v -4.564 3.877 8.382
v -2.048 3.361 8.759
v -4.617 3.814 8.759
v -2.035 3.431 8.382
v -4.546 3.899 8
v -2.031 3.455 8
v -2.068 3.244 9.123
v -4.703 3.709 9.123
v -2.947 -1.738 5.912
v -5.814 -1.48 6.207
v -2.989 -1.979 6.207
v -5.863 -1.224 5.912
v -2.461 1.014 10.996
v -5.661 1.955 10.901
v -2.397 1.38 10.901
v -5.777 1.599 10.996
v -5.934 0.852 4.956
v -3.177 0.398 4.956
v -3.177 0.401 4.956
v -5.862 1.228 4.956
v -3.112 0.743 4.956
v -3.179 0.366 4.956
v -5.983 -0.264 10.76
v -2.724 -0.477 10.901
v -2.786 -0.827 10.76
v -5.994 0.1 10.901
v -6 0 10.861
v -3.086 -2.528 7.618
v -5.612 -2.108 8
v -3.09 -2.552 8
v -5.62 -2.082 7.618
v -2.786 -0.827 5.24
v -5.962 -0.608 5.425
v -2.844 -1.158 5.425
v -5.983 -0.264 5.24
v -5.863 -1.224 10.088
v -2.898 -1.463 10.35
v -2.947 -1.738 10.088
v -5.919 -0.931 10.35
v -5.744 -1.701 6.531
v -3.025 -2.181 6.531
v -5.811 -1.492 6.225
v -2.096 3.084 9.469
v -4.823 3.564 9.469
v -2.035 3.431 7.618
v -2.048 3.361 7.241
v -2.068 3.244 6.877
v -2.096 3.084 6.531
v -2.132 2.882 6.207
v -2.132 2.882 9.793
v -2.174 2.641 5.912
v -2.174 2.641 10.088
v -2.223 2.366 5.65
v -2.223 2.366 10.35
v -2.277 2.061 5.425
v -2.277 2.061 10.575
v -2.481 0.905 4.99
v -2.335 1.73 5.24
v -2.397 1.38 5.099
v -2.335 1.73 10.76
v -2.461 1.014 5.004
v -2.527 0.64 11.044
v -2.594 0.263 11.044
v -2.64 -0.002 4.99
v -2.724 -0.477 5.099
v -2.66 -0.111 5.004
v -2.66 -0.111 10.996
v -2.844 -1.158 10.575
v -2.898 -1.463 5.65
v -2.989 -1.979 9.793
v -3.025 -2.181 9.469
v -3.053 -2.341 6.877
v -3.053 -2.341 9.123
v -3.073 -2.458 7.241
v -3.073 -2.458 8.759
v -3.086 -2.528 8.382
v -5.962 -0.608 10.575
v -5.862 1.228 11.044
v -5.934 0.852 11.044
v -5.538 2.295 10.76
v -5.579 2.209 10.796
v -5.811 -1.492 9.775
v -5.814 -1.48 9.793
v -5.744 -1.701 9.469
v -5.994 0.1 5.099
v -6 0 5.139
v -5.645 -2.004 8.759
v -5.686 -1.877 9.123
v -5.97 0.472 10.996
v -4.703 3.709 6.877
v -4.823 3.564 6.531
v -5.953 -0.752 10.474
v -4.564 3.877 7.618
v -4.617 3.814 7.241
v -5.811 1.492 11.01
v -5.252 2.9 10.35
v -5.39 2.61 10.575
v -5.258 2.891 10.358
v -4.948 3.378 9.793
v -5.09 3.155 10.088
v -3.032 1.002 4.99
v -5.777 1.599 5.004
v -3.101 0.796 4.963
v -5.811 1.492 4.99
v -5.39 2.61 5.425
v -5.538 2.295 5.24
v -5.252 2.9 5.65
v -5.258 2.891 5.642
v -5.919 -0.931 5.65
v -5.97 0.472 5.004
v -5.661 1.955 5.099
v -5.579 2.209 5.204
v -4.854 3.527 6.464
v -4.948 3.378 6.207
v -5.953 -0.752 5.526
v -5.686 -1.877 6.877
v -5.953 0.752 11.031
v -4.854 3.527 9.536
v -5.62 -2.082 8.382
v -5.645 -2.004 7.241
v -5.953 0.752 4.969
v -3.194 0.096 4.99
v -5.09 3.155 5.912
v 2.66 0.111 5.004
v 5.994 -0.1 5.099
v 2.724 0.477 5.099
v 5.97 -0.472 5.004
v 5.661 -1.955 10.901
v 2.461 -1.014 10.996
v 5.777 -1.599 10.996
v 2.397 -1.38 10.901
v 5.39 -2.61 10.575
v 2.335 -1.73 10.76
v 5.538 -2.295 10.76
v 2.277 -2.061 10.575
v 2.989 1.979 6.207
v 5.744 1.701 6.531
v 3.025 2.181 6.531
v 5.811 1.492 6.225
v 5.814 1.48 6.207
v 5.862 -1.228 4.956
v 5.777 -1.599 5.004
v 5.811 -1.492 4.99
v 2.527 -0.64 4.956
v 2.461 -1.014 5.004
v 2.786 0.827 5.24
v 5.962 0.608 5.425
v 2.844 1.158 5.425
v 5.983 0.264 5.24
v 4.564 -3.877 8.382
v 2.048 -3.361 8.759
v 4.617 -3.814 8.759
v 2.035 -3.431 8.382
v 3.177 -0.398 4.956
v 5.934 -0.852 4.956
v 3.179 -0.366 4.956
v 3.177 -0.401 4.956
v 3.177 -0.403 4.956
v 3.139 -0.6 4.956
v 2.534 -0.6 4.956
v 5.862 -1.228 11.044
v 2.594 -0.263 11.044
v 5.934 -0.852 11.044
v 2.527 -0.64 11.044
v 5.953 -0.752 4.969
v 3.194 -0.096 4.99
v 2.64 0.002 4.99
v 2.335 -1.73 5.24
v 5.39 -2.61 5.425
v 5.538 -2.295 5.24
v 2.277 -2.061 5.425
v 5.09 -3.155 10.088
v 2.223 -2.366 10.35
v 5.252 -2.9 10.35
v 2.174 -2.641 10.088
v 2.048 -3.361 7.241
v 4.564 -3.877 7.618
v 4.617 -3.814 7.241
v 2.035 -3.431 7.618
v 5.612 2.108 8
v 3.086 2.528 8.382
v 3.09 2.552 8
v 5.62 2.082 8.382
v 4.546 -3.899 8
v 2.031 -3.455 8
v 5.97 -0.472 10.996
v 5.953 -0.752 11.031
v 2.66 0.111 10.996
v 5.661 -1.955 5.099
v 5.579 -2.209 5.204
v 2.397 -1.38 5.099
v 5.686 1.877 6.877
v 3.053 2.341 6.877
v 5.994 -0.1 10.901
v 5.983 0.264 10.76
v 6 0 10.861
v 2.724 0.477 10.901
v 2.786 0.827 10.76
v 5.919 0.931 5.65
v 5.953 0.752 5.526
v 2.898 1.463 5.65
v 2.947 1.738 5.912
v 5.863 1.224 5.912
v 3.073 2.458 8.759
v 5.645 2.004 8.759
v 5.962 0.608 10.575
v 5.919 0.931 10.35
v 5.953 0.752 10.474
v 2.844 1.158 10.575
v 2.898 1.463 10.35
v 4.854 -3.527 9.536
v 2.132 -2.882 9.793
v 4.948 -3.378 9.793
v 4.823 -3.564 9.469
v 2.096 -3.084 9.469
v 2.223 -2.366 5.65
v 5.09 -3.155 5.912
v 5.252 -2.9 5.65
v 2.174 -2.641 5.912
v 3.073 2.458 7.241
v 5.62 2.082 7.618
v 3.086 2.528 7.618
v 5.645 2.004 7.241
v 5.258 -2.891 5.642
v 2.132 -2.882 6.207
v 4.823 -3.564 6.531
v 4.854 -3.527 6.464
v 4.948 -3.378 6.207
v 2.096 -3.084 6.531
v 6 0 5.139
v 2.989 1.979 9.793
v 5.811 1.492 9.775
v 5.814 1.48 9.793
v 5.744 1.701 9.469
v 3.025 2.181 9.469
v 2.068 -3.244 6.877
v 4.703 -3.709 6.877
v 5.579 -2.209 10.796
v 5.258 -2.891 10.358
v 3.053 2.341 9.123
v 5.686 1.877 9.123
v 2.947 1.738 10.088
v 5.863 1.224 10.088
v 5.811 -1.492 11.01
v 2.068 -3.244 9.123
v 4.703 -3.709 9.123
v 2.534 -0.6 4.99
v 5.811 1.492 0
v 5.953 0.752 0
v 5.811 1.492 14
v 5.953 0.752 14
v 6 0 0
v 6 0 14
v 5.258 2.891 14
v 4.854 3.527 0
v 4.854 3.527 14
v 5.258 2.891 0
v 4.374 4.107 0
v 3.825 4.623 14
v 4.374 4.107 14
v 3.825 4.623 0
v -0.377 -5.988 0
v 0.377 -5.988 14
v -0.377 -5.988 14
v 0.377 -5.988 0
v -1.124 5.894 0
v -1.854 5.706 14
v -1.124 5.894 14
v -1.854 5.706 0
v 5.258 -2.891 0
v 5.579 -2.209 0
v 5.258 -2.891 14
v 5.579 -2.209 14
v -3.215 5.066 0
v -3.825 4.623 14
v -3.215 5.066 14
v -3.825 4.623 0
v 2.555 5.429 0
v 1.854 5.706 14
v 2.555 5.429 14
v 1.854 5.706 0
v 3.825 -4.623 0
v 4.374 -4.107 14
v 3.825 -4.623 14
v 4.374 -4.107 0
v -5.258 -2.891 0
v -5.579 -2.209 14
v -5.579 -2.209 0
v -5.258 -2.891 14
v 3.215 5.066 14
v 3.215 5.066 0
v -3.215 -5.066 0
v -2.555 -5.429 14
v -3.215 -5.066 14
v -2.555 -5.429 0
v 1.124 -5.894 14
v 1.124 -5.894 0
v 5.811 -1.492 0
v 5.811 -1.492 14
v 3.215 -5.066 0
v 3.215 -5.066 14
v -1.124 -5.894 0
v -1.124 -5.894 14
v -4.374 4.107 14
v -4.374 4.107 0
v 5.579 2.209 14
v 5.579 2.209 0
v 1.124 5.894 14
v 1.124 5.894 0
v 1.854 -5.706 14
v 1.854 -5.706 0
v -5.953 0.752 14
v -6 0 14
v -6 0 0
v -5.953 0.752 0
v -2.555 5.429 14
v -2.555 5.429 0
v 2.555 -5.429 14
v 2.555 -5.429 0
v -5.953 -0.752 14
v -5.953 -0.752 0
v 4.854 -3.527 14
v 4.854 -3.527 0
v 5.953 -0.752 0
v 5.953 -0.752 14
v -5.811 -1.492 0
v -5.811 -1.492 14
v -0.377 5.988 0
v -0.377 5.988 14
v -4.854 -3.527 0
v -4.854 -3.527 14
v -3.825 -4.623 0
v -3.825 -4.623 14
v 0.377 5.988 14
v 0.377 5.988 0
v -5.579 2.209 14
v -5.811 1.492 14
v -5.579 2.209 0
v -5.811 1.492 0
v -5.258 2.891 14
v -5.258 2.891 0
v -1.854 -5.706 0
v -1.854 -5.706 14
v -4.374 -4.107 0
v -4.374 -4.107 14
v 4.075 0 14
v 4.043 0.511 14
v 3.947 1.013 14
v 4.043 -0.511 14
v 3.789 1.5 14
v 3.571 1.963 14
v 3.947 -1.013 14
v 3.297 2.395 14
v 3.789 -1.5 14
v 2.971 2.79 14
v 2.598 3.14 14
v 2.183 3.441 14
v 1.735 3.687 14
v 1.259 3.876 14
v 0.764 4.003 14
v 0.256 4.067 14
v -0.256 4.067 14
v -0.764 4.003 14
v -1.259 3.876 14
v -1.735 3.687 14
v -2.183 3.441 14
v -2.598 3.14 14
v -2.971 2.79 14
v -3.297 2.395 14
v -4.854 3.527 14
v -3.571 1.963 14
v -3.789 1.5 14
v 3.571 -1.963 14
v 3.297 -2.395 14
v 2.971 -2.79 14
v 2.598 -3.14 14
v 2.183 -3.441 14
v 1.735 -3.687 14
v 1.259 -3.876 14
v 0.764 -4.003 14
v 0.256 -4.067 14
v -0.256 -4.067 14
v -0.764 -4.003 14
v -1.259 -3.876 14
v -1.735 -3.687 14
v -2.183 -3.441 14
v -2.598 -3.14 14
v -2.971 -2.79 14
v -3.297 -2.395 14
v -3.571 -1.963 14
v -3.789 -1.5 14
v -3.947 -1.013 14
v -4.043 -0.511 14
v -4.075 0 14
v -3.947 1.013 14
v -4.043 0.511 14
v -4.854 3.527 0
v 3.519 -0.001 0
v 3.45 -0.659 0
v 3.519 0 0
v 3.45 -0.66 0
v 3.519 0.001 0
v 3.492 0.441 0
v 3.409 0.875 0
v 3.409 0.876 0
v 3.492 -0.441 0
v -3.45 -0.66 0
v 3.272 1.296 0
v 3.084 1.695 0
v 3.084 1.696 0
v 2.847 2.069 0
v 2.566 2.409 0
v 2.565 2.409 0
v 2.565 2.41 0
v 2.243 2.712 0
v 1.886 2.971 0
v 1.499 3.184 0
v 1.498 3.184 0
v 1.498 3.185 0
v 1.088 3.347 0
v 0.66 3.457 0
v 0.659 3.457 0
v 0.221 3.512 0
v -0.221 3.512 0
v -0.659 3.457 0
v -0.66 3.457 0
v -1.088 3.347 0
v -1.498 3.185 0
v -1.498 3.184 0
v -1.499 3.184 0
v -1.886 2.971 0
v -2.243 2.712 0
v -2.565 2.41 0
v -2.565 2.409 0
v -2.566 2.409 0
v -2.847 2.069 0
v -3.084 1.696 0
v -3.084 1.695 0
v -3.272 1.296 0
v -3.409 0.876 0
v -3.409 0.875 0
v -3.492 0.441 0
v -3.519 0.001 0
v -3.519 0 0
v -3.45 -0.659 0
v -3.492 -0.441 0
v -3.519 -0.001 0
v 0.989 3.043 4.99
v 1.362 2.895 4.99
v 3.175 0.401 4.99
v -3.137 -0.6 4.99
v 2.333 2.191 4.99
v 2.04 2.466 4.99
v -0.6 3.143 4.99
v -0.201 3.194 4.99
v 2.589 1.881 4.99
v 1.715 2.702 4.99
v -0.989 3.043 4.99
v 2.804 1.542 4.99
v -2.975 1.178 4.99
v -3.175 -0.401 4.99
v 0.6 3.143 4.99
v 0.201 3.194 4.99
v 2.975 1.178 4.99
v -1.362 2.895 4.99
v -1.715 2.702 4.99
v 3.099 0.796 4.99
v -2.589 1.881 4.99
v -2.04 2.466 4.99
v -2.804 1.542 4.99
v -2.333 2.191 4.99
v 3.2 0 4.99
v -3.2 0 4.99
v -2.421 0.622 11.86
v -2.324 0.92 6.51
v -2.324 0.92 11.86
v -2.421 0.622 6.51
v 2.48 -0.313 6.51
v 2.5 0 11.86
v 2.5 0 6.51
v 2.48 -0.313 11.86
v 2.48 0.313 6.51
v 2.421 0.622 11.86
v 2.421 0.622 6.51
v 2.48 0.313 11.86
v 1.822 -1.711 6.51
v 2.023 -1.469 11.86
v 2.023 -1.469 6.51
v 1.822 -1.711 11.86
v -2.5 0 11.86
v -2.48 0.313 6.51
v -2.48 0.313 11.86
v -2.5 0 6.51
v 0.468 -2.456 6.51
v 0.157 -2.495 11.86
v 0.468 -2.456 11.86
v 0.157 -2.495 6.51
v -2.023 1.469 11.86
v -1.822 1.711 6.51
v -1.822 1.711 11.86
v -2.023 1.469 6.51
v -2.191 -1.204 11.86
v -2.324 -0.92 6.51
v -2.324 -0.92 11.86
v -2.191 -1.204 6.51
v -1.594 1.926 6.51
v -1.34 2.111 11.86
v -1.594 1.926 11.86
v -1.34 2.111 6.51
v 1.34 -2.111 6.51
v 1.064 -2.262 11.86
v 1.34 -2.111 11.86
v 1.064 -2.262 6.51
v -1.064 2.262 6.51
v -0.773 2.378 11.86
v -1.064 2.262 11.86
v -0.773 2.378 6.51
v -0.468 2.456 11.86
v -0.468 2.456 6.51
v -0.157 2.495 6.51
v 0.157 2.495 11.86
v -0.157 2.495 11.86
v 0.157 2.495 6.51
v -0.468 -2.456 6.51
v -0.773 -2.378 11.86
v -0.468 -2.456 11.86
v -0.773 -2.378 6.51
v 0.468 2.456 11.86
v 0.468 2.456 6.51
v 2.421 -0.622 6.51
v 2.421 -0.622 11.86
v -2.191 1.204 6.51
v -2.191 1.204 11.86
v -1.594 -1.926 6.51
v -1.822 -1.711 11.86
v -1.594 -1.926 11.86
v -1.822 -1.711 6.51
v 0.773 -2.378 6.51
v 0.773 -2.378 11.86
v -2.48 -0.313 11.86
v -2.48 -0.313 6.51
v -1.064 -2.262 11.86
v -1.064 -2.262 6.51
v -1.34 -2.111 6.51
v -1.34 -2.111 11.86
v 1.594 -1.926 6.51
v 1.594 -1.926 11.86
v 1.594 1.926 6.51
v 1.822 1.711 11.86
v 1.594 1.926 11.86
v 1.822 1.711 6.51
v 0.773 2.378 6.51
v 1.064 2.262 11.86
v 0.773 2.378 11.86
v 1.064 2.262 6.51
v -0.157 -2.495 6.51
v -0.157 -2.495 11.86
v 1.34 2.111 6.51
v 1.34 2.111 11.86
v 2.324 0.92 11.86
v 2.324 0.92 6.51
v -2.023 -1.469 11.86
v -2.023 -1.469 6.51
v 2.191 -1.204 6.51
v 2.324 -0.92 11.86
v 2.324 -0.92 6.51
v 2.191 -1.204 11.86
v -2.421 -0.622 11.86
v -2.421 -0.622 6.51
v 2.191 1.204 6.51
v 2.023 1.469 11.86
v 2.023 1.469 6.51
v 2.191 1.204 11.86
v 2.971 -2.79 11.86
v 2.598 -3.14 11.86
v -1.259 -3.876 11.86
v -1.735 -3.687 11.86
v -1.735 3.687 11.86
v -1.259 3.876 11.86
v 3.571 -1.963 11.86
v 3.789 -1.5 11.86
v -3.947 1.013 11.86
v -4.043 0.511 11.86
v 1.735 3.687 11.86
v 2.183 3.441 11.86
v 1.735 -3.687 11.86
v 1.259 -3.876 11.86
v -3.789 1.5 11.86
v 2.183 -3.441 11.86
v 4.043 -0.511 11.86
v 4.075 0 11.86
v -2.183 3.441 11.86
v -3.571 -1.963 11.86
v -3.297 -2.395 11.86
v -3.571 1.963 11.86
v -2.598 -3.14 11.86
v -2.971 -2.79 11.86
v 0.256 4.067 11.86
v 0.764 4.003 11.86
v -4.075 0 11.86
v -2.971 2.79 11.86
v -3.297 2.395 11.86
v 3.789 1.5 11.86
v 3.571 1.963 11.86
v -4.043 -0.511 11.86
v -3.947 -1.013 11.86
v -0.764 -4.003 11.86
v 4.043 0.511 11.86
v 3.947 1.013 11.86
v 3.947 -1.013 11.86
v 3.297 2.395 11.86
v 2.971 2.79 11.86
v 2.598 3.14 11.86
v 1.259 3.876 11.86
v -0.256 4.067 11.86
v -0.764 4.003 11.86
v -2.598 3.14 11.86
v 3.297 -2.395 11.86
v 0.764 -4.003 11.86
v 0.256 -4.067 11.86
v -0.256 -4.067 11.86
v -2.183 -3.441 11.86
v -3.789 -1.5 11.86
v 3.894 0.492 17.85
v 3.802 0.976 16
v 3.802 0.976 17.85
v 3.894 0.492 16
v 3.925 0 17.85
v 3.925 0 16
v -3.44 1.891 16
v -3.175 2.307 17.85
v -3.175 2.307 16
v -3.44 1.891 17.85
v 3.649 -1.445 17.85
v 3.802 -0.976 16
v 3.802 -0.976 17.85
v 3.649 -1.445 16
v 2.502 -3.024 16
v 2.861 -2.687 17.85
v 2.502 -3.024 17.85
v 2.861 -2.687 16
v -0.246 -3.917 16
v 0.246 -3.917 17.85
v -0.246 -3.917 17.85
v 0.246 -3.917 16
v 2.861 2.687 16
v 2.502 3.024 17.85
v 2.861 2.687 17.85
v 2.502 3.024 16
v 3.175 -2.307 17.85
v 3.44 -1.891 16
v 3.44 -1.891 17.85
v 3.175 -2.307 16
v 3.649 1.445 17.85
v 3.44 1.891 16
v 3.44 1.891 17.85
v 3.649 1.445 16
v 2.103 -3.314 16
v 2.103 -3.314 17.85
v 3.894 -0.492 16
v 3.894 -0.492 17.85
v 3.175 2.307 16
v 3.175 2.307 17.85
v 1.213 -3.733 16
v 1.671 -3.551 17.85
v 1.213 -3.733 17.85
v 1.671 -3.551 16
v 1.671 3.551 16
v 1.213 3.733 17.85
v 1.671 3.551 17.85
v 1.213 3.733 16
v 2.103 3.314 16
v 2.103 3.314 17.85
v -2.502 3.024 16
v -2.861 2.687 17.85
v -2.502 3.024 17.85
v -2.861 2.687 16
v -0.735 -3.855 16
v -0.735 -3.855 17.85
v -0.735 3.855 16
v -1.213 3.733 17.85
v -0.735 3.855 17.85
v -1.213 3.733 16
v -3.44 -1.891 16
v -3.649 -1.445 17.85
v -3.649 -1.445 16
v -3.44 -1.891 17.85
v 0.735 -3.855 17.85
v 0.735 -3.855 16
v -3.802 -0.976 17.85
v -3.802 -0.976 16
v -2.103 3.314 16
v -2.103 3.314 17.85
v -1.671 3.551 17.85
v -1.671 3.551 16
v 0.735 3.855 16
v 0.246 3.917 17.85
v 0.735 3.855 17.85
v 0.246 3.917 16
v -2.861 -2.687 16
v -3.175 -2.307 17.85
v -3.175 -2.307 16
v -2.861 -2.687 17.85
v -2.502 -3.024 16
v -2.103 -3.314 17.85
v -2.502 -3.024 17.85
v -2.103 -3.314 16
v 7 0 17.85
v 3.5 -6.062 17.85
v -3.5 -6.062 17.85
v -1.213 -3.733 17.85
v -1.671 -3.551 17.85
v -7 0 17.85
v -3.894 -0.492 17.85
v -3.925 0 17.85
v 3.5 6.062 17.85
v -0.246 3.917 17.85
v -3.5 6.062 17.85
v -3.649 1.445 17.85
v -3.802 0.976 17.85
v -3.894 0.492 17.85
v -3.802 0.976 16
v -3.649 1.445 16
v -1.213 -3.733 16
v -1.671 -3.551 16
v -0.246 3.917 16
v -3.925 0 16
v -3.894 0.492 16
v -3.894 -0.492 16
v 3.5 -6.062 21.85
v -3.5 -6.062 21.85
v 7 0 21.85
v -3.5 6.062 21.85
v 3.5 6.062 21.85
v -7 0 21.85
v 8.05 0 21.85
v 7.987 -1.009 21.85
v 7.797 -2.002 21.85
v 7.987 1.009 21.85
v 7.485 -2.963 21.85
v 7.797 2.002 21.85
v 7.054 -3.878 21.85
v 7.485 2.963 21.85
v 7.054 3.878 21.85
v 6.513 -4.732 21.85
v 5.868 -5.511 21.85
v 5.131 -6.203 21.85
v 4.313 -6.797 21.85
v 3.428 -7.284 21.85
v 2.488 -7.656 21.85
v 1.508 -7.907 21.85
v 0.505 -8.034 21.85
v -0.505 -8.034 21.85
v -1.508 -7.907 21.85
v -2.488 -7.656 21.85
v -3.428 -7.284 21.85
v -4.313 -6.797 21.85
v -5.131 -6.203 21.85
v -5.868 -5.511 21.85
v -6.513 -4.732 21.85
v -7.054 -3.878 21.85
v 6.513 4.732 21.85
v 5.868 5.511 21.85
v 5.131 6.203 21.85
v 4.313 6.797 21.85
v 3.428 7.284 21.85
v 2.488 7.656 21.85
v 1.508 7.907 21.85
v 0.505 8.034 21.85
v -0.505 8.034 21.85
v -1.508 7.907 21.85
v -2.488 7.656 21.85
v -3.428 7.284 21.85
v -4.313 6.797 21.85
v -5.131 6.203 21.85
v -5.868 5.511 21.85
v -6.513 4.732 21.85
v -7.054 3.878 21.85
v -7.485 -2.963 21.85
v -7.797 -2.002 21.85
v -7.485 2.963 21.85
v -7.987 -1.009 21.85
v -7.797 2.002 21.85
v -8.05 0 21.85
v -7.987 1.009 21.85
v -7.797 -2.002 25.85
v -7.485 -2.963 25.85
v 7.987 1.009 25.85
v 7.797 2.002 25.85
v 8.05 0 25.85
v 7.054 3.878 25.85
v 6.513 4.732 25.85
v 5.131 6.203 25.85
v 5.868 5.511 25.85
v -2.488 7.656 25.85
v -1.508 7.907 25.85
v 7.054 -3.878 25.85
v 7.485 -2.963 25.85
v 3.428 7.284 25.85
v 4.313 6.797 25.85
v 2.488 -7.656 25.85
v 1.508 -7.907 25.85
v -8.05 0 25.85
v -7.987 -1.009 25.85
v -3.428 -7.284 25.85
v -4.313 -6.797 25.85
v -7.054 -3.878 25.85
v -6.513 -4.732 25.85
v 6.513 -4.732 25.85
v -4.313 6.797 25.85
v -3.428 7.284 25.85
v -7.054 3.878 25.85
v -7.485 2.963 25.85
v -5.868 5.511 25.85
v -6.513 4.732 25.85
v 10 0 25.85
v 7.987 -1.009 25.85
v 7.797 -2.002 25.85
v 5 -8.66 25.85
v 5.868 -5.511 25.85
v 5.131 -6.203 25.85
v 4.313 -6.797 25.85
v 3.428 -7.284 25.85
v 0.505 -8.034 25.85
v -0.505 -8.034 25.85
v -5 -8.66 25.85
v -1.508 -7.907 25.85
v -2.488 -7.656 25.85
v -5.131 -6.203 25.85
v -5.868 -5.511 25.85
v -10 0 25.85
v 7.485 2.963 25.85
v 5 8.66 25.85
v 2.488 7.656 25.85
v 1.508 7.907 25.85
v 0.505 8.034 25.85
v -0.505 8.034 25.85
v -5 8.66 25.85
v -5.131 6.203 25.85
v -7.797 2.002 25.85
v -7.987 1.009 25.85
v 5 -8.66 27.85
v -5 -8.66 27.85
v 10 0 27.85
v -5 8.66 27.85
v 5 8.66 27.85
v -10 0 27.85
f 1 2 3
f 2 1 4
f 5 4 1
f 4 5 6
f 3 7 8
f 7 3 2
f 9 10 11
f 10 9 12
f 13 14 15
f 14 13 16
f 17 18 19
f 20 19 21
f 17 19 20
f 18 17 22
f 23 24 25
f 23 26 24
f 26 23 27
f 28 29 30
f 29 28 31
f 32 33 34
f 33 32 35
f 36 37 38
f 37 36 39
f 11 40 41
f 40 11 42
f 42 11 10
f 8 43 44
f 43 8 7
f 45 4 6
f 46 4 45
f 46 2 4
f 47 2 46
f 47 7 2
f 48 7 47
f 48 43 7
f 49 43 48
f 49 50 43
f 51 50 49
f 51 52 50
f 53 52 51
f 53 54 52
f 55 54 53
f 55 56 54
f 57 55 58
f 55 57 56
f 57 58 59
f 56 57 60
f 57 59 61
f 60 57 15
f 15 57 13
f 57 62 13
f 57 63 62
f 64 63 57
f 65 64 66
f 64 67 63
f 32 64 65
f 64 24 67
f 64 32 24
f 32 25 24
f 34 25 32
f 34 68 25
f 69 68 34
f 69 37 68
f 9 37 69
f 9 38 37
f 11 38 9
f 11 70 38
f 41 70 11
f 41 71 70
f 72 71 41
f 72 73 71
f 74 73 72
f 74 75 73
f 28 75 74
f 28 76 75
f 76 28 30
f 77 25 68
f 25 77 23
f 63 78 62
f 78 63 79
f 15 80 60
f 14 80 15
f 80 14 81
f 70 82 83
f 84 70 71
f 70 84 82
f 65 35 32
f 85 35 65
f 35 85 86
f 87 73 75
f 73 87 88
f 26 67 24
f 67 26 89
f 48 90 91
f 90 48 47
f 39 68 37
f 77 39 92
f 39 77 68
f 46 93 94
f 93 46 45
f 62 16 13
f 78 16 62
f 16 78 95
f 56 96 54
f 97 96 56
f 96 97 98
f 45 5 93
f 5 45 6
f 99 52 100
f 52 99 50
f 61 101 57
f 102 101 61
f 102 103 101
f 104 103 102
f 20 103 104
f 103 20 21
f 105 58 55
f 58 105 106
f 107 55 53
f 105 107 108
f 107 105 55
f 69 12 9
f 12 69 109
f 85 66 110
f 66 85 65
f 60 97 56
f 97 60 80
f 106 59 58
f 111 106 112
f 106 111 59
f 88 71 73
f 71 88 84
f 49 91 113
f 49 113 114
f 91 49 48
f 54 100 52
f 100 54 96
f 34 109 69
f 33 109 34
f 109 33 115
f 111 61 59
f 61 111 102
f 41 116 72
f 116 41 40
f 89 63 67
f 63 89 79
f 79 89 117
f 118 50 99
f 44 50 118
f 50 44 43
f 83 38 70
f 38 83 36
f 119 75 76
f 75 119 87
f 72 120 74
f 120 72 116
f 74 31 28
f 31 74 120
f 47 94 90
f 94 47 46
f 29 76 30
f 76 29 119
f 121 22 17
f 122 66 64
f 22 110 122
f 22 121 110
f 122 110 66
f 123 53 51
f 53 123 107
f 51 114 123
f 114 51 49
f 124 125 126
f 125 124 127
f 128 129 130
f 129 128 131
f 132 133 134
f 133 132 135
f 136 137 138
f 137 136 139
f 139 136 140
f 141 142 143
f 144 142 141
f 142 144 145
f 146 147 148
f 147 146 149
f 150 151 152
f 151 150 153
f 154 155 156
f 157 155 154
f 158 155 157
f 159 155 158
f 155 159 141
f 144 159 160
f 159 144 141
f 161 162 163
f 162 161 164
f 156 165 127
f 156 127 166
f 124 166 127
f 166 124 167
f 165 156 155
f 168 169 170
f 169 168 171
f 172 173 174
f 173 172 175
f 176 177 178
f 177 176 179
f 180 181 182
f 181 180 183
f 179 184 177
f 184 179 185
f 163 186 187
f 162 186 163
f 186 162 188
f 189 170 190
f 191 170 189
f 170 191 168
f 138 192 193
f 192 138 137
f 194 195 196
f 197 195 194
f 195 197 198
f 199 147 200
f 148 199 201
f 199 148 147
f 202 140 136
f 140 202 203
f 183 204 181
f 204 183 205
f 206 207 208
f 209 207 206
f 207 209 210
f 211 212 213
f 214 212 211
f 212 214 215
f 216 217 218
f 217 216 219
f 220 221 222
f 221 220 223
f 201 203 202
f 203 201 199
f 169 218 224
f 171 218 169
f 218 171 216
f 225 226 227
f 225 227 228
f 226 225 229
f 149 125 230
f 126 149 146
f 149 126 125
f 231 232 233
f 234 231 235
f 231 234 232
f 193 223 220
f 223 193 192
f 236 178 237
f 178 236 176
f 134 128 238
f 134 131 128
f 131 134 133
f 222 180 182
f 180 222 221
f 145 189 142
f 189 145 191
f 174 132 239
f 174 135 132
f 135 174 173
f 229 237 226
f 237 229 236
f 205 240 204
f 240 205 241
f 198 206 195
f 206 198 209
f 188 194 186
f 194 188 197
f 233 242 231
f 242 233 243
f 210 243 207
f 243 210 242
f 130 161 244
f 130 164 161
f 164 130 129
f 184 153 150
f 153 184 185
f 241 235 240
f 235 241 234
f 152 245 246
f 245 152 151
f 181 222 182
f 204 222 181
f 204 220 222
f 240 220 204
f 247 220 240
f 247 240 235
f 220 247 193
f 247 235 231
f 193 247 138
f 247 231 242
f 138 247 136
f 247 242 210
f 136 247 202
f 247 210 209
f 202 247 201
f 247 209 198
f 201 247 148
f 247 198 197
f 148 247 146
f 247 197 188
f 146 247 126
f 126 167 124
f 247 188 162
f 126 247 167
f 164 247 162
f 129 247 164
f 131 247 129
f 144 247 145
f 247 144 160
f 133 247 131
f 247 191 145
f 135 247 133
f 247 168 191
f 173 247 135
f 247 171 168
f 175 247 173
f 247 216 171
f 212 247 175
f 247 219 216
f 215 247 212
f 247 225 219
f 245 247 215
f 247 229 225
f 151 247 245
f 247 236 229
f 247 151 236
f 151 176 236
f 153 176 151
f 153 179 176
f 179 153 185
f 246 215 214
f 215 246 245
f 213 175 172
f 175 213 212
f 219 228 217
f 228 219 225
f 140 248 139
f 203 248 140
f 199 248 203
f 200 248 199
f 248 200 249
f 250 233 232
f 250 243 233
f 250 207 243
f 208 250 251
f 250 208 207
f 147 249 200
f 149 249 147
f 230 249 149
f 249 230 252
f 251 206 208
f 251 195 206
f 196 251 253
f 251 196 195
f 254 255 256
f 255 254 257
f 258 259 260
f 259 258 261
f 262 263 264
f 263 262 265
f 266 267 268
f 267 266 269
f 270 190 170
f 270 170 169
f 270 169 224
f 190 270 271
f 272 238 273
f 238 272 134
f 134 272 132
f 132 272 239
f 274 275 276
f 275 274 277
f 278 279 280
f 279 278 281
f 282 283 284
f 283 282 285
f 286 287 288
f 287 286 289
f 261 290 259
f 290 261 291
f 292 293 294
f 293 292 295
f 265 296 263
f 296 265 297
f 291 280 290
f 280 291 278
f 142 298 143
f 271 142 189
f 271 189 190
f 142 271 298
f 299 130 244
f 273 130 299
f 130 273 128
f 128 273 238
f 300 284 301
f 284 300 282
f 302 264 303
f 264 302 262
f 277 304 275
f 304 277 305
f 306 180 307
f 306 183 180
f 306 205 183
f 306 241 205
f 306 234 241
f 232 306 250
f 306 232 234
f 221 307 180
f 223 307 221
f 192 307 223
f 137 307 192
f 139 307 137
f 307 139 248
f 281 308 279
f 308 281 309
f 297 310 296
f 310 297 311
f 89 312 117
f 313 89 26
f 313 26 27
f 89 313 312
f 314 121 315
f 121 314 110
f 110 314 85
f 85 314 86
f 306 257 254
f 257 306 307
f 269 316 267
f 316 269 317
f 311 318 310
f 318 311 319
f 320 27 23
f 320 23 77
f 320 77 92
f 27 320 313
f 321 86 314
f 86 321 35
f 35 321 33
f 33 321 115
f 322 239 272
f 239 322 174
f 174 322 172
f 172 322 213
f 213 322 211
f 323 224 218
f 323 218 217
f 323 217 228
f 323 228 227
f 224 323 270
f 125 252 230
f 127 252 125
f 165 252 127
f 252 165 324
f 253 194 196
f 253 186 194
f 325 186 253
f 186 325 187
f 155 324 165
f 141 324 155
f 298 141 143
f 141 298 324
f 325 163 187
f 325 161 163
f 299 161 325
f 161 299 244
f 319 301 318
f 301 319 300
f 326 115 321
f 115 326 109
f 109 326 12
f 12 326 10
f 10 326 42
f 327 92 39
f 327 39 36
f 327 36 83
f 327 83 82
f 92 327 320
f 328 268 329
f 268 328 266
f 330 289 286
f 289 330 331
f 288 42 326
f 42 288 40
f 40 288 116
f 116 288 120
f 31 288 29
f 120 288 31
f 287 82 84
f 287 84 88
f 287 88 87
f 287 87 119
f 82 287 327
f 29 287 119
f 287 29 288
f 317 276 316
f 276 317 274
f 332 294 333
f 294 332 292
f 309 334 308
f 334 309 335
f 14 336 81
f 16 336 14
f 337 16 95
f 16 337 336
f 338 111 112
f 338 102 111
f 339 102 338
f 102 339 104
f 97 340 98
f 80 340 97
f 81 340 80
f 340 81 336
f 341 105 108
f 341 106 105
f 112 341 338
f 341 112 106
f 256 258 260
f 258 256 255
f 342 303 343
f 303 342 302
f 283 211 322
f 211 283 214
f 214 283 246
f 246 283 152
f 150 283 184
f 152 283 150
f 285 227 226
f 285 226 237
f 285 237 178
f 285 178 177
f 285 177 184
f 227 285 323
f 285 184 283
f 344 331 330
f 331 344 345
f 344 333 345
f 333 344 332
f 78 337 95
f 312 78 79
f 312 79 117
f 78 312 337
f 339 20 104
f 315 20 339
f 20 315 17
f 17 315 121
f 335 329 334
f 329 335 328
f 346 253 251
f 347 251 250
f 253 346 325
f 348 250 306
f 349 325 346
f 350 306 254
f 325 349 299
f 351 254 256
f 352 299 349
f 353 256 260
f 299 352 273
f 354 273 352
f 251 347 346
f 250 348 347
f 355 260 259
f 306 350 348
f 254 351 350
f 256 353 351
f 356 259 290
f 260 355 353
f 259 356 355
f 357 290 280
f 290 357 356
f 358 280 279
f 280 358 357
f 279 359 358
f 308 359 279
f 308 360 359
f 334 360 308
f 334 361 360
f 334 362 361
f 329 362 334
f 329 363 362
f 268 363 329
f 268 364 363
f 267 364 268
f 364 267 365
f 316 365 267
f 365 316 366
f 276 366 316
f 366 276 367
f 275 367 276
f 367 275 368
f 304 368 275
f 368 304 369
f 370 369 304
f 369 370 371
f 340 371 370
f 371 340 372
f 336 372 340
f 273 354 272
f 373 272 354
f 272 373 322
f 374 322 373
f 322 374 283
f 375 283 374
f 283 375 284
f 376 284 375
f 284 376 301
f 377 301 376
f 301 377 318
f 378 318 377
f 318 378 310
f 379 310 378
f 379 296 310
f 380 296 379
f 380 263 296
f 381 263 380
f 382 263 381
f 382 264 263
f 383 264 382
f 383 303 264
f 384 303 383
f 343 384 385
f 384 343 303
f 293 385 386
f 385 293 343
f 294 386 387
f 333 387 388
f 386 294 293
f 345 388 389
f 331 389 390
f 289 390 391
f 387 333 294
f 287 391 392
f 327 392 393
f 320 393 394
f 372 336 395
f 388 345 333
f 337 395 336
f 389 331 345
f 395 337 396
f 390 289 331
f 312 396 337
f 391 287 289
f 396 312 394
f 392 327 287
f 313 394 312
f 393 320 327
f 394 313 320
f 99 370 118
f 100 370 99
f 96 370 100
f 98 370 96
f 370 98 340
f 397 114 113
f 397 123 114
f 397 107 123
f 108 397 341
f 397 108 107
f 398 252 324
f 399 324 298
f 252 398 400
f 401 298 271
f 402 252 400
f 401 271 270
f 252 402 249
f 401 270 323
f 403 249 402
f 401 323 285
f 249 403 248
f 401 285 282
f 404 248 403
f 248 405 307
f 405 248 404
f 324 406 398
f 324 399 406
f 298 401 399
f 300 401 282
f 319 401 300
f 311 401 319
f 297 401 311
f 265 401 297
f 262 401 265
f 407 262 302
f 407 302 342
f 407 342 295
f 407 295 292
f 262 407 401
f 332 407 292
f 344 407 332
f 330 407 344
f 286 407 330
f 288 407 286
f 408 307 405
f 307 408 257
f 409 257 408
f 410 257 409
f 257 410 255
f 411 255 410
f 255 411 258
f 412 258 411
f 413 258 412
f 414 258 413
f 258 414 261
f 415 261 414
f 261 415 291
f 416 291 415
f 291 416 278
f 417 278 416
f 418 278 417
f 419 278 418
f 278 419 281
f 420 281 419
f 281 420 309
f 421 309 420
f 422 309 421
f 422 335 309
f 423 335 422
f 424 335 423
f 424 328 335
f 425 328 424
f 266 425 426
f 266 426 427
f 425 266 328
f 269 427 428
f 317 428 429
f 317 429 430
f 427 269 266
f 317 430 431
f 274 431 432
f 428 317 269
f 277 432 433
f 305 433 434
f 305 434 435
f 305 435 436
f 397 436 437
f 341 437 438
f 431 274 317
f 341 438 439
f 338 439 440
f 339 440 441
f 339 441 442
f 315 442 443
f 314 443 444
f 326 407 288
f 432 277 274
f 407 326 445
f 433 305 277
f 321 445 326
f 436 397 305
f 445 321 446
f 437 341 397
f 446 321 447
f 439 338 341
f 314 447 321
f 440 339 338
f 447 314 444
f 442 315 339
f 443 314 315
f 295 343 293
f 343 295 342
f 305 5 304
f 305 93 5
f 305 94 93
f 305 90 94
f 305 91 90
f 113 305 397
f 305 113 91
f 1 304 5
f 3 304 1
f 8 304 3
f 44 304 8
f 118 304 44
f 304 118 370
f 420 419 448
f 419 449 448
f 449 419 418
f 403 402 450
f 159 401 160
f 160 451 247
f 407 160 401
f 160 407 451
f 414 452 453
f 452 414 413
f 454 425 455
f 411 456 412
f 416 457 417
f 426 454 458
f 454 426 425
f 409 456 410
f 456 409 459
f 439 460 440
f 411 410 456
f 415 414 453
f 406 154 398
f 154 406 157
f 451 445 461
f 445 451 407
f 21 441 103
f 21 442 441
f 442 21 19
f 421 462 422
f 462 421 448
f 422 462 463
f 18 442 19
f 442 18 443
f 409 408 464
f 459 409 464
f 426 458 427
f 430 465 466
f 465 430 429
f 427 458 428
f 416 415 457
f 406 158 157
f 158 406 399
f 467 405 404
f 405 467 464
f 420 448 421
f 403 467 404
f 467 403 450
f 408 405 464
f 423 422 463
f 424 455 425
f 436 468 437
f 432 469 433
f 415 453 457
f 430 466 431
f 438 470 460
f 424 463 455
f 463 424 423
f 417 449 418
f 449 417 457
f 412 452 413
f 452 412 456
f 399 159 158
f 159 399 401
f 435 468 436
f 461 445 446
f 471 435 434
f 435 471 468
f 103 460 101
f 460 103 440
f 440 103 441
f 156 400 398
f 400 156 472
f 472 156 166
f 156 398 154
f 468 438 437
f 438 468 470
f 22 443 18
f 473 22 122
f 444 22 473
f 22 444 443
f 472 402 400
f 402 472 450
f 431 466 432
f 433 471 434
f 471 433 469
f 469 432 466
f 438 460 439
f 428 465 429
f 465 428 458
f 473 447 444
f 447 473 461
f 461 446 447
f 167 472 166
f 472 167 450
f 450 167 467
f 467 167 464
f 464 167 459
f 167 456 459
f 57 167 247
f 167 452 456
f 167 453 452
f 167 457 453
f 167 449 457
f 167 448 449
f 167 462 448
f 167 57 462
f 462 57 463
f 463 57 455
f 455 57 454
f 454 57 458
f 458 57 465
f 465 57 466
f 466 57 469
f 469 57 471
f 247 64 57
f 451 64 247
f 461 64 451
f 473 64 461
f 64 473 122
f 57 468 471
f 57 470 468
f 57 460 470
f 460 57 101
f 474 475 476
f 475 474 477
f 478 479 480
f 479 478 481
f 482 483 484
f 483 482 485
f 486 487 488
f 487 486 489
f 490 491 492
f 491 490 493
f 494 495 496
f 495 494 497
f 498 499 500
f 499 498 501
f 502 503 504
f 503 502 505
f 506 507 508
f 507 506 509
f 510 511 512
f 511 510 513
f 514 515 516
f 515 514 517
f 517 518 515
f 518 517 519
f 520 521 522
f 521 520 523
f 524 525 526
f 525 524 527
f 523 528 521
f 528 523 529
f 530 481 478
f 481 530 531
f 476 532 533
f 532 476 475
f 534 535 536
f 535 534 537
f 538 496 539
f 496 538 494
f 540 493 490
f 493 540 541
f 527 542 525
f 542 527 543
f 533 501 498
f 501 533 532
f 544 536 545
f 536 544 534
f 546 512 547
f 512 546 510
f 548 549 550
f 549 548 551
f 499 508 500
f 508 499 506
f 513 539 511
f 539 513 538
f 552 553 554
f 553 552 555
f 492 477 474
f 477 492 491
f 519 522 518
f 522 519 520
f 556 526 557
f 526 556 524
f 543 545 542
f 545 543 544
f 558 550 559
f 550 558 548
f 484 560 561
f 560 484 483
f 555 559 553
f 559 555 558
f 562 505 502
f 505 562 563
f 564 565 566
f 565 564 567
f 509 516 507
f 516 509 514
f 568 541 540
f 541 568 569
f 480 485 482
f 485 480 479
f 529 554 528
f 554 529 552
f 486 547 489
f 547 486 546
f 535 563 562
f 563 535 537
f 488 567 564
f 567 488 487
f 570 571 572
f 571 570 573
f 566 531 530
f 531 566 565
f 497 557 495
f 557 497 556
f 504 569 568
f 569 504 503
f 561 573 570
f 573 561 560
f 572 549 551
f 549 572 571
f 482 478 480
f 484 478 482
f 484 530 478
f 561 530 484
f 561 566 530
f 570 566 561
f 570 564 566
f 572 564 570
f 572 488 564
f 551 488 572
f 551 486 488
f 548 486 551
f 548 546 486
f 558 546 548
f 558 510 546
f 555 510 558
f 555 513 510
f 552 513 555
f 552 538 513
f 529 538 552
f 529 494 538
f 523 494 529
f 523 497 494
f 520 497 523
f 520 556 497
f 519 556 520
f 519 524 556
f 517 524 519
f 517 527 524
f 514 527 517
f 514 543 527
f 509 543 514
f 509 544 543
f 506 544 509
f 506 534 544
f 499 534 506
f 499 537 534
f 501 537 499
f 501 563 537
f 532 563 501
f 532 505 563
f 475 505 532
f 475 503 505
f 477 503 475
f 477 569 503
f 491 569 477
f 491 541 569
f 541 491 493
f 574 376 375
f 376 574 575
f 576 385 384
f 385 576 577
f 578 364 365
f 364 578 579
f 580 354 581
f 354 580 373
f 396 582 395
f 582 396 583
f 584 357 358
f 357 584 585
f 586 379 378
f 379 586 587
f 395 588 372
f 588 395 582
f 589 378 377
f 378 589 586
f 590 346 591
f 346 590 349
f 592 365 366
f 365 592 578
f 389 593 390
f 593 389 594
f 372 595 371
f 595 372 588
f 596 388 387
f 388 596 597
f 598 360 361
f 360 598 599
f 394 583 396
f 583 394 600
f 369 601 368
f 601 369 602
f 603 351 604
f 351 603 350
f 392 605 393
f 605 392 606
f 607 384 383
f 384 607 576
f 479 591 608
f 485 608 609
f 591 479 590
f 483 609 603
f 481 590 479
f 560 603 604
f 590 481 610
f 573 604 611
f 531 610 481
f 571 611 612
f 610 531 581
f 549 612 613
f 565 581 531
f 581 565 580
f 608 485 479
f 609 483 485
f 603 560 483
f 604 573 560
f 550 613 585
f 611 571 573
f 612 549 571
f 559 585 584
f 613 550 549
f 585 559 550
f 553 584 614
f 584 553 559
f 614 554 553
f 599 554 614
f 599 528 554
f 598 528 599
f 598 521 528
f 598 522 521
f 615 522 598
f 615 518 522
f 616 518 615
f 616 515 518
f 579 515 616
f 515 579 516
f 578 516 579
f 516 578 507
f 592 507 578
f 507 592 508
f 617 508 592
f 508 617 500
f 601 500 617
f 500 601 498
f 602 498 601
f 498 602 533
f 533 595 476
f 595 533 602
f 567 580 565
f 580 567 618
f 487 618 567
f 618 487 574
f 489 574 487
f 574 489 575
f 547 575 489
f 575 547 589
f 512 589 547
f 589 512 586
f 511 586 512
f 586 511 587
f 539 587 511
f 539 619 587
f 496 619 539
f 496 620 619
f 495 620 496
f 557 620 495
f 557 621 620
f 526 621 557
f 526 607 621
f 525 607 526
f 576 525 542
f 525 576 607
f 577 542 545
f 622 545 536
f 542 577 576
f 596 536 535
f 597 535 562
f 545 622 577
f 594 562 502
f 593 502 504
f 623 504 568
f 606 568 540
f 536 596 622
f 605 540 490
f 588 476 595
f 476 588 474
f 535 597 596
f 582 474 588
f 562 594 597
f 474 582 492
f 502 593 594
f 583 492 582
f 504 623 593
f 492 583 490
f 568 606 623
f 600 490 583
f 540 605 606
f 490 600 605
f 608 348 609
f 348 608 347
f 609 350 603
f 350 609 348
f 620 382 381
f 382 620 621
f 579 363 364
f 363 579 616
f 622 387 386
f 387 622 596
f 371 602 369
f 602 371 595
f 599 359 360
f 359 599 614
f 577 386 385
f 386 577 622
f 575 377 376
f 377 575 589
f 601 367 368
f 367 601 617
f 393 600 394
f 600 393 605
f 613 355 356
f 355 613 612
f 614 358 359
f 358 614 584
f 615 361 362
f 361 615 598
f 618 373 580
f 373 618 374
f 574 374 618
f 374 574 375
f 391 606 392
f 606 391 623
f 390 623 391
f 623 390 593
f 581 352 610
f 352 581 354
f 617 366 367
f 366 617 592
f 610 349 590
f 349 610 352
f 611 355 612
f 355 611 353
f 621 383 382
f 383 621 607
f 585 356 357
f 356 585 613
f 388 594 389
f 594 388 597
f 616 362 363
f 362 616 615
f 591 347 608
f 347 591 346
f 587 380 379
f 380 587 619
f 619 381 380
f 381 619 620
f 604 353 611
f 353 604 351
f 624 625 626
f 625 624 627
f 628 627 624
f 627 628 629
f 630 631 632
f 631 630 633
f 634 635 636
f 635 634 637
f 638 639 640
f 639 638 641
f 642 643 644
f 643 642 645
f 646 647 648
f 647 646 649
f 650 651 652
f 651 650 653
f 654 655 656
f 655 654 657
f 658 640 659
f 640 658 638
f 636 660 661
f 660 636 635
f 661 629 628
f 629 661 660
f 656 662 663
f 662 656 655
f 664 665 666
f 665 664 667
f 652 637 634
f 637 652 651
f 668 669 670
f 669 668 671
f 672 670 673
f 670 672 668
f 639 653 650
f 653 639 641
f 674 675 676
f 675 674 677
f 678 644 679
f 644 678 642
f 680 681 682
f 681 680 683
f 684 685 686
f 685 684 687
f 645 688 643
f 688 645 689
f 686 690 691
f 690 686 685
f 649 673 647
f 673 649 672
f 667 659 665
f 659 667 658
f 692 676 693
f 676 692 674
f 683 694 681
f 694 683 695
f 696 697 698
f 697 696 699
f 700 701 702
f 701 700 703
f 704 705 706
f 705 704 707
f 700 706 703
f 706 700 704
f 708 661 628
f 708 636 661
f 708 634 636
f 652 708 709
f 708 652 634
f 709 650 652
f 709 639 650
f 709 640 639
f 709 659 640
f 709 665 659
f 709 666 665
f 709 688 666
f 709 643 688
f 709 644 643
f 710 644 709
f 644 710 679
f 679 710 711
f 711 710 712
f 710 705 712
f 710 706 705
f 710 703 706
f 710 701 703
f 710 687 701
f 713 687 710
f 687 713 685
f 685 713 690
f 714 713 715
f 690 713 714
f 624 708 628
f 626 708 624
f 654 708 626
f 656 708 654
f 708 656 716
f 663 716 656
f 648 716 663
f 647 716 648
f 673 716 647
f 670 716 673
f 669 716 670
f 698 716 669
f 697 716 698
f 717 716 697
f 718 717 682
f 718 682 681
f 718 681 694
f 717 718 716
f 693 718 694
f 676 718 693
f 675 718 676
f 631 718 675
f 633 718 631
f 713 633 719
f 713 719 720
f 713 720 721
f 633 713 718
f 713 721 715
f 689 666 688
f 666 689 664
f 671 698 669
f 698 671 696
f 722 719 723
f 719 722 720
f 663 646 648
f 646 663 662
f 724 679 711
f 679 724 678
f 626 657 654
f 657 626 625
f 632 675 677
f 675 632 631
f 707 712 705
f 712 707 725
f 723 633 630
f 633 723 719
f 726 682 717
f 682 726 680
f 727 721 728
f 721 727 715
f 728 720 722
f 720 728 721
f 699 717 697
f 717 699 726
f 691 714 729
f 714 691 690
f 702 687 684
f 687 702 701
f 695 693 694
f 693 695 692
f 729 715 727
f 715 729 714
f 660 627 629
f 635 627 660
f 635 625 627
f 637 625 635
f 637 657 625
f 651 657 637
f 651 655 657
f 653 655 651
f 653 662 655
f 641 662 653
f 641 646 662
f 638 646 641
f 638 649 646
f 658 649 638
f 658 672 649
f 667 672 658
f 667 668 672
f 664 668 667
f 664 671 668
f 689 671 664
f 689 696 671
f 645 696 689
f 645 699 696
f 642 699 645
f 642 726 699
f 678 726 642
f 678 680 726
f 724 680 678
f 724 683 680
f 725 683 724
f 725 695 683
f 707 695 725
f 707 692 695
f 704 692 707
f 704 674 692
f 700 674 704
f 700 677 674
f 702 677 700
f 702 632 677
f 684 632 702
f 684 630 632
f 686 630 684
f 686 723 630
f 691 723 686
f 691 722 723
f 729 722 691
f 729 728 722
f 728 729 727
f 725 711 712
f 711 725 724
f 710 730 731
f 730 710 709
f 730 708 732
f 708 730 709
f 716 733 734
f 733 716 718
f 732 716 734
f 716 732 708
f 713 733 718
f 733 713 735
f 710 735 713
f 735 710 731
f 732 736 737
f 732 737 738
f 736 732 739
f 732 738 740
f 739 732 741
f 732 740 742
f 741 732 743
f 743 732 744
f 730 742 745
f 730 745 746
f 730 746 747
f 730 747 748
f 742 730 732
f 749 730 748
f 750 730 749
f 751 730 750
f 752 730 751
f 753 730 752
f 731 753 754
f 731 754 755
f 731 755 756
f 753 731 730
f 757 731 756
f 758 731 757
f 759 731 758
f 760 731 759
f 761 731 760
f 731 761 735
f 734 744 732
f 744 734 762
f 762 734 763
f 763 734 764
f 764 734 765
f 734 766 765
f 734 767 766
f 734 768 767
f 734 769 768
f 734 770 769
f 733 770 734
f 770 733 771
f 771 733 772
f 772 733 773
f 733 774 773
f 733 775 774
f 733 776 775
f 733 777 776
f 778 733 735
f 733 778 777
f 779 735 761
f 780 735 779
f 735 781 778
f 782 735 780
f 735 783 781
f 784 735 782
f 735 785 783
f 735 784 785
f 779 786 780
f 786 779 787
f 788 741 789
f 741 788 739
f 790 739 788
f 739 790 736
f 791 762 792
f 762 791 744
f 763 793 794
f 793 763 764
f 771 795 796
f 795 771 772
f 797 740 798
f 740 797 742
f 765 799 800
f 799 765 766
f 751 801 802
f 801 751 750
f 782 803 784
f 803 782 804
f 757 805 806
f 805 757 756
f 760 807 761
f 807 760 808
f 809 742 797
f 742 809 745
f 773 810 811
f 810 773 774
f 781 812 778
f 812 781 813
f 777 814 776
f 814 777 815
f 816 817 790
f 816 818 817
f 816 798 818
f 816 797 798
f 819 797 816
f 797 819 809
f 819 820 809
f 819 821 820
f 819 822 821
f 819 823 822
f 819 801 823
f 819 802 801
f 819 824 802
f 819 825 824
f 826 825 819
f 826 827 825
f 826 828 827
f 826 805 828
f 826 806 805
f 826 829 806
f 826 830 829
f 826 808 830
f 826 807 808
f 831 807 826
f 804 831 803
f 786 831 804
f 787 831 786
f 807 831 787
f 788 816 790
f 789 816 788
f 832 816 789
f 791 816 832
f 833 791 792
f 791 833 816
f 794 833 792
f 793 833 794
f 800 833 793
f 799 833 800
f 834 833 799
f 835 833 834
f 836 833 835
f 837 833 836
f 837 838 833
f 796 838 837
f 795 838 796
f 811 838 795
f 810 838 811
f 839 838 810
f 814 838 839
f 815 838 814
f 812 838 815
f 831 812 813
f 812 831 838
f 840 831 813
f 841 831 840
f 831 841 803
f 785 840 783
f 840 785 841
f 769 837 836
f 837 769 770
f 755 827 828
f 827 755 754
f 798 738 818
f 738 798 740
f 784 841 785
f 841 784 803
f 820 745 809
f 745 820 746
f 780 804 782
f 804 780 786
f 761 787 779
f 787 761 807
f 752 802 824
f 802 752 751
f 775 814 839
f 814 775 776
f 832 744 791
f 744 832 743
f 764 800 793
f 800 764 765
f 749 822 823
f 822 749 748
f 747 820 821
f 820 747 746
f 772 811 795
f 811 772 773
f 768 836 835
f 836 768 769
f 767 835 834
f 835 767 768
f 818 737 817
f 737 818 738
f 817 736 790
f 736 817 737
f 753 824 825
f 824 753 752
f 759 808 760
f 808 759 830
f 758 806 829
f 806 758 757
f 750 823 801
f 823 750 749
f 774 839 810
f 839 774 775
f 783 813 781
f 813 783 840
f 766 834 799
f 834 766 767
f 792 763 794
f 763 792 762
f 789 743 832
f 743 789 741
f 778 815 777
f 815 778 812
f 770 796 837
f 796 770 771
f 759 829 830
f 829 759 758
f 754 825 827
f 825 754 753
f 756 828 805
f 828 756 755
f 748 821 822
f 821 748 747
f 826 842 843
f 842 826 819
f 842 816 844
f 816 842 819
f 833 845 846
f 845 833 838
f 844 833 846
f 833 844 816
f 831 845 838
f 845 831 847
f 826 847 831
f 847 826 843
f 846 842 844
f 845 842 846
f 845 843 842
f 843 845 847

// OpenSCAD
$fn = 50;

MAG_DIAMETER = 6.1;
MAG_HEIGHT = 2;

ASSEMBLY_WIDTH = 22; // width of the assembly up to the flange

SENSOR_OFFSET = 8; // where the midpoint of the sensor will sit
SENSOR_HOLE_DIAMETER = 5;
SENSOR_WIDTH = 4;  // physical outer dimensions of the sensor
SENSOR_HEIGHT = 3;

SENSOR_HOLDER_DIAMETER = 14;
SENSOR_HOLDER_FLANGE_DIAMETER = 20; // bit outside the base
BASE_HOLE_DIAMETER = 16.1;
BASE_INTERFERENCE_WIDTH = 4;

HOLDER_OVERLAP = 2;
OVERLAP_DIAMETER = 8;

MAG_HOLDER_DIAMETER = 12;
MAG_HOLDER_LENGTH = 14;
MAG_ROTATION_OFFSET = 80;

POT_SHAFT_HEIGHT = 5;
POT_SHAFT_DIAMETER = 6.4;
POT_SHAFT_RECESS = 2.6;


module copy_mirror(vec=[0,1,0]) 
{ 
    children(); 
    mirror(vec) children(); 
}

module pot_shaft_hole() {

    radius = POT_SHAFT_DIAMETER / 2;
    width = POT_SHAFT_DIAMETER - POT_SHAFT_RECESS;

    translate([0,0,POT_SHAFT_HEIGHT])
    rotate([180,0,0])
    linear_extrude(height = POT_SHAFT_HEIGHT, scale = 1.1) 
    intersection() {
        circle(radius);
        translate([-radius, -radius]) square([POT_SHAFT_DIAMETER, width]);
    }

}

module mag_holder() {

    difference() {
        cylinder(d = MAG_HOLDER_DIAMETER, h = MAG_HOLDER_LENGTH);
        translate([0, 0, -0.01])
        pot_shaft_hole();

        // holes for magnets
        rotate([0, 0, MAG_ROTATION_OFFSET])
        copy_mirror()
        translate([0, MAG_DIAMETER, SENSOR_OFFSET]) 
        rotate([90, 0, 0]) 
        cylinder(d = MAG_DIAMETER, h = (MAG_HOLDER_DIAMETER - SENSOR_HOLE_DIAMETER) /2 );

        translate([0, 0, MAG_HOLDER_LENGTH + 0.01])
        rotate([0, 180, 0])
        cylinder(d = SENSOR_HOLE_DIAMETER, h = MAG_HOLDER_LENGTH - SENSOR_OFFSET + (SENSOR_HEIGHT /2 ));

        translate([0, 0, MAG_HOLDER_LENGTH + 0.01])
        rotate([0, 180, 0])
        cylinder(d = OVERLAP_DIAMETER + 0.15, h = HOLDER_OVERLAP + 0.15);

    }
    
}


module sensor_holder() {
    overlap = HOLDER_OVERLAP - 0.15;
    main_width = ASSEMBLY_WIDTH - MAG_HOLDER_LENGTH - BASE_INTERFERENCE_WIDTH;
    cylinder(d = OVERLAP_DIAMETER - 0.15, h = overlap);
    translate([0, 0, overlap])
    cylinder(d = SENSOR_HOLDER_DIAMETER, h = main_width, $fn = 6);
    translate([0, 0, overlap + main_width])
    cylinder(d = BASE_HOLE_DIAMETER, h = BASE_INTERFERENCE_WIDTH);
    translate([0, 0, overlap + main_width + BASE_INTERFERENCE_WIDTH])
    cylinder(d = SENSOR_HOLDER_FLANGE_DIAMETER, h = 2, $fn = 6);

}

mag_holder();
translate([0, 0, MAG_HOLDER_LENGTH + HOLDER_OVERLAP]) 
sensor_holder();
